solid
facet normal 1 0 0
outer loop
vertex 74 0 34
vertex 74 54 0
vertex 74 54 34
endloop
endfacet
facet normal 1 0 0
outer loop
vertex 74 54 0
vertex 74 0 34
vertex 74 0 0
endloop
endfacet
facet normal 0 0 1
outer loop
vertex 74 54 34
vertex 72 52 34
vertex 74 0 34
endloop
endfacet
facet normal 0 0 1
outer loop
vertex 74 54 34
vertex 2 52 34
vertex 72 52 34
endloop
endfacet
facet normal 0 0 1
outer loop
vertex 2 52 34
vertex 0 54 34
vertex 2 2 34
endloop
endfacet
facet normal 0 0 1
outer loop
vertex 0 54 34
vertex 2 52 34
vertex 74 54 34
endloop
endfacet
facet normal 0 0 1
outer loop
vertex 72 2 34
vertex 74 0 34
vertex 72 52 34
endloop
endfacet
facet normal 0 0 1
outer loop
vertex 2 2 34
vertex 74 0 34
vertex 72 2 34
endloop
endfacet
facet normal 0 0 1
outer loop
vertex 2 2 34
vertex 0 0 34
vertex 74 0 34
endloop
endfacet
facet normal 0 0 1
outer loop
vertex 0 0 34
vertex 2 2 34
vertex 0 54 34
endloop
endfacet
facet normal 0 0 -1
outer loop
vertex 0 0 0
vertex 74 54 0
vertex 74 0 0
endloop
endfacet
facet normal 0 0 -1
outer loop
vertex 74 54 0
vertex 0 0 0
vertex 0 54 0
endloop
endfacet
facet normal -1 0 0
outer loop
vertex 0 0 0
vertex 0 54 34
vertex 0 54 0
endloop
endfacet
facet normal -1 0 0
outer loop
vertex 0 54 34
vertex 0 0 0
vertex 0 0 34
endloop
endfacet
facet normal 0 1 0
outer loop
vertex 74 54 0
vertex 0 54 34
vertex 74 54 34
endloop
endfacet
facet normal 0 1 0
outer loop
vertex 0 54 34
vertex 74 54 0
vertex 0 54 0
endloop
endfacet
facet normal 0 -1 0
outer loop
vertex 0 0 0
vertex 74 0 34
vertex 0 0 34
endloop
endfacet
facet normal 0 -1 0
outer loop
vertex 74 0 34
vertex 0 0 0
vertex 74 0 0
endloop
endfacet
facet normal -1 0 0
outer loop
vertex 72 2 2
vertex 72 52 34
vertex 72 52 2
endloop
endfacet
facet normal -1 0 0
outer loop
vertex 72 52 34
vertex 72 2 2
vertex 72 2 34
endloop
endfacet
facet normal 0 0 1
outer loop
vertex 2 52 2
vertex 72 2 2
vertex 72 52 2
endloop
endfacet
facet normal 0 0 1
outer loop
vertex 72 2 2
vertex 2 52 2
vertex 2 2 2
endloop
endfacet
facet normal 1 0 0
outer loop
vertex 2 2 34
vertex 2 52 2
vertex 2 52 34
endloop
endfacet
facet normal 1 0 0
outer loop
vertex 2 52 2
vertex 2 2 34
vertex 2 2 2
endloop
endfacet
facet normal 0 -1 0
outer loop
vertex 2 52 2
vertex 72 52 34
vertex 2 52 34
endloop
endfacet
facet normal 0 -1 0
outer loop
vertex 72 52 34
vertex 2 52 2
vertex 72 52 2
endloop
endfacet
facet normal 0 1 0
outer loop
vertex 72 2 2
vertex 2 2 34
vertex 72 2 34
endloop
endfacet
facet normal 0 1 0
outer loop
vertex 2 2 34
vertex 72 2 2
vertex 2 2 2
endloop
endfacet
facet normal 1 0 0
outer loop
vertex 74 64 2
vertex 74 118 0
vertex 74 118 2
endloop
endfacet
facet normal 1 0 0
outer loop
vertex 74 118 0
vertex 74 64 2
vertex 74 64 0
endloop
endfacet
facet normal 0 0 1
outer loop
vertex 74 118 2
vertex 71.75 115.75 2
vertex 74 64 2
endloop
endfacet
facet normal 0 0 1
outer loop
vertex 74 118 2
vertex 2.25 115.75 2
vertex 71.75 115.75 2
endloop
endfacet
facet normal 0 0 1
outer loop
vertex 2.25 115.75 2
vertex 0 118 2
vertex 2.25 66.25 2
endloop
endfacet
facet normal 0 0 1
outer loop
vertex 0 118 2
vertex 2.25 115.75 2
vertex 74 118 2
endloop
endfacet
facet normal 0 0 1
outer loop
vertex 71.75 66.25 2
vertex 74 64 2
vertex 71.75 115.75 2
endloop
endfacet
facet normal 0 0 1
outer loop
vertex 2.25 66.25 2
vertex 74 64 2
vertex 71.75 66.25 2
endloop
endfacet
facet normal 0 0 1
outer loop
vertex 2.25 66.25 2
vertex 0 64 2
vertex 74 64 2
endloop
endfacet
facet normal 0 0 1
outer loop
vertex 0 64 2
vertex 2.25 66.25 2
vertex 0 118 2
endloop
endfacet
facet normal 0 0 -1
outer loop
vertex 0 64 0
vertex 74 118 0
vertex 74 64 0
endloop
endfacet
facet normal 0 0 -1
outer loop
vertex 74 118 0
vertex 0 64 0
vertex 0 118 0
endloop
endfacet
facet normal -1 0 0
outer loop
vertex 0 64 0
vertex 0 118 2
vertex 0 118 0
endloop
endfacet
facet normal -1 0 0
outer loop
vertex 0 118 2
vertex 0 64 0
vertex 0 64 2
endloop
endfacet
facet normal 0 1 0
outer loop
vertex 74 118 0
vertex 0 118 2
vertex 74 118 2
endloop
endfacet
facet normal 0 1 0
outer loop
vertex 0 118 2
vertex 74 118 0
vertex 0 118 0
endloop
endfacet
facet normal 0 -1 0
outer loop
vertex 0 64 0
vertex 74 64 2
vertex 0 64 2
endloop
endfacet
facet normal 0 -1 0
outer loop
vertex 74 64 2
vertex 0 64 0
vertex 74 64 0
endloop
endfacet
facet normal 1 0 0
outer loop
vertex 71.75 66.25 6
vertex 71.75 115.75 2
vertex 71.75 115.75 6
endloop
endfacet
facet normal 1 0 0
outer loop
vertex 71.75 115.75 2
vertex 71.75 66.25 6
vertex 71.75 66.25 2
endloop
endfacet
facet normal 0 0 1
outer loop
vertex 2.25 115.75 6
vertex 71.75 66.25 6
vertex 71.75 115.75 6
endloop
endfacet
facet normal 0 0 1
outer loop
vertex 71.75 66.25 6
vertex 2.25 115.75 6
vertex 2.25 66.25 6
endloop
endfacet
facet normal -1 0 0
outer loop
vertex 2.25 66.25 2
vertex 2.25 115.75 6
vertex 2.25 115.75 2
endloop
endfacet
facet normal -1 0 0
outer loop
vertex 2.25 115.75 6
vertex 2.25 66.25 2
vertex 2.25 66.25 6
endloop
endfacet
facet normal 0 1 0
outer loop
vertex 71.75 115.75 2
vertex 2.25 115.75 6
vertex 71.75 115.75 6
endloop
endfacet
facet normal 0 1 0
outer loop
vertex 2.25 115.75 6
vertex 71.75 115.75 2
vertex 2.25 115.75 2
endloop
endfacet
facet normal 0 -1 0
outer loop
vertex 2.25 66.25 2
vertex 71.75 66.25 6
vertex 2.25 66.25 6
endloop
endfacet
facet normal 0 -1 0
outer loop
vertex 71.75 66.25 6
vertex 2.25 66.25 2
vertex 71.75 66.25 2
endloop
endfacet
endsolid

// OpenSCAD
// Box with a press-fit lid - a hollow rectangular box (open top) and a separate lid whose plug
// drops into the opening. The two parts are laid side by side. NOVEL general part.
//
// @desc hollow box with a separate press-fit lid
// @prompt Design a small box with a lid in OpenSCAD: an inner space {il} by {iw} by {ih} mm with {wall} mm walls, and a separate lid whose plug drops {lip} mm into the opening. Lay the two parts side by side. Reply with a single complete OpenSCAD file.
// @param il   inner length, mm     [20:80]
// @param iw   inner width, mm      [20:60]
// @param ih   inner height, mm     [10:50]
// @param wall wall thickness, mm   [1.6:4]
// @param lip  lid plug depth, mm   [3:10]

il   = 70;
iw   = 50;
ih   = 32;
wall = 2;
lip  = 4;

$fn = 32;

ol = il + 2 * wall;
ow = iw + 2 * wall;

module box() {
    difference() {
        cube([ol, ow, ih + wall]);
        translate([wall, wall, wall]) cube([il, iw, ih + 1]);   // open-top cavity
    }
}

module lid() {
    cl = il - 0.5;                 // plug: 0.25 mm clearance per side
    cw = iw - 0.5;
    union() {
        cube([ol, ow, wall]);                                    // top plate, full footprint
        translate([(ol - cl) / 2, (ow - cw) / 2, 0])
            cube([cl, cw, wall + lip]);                          // plug (overlaps the plate -> one solid)
    }
}

box();
translate([0, ow + 10, 0]) lid();
